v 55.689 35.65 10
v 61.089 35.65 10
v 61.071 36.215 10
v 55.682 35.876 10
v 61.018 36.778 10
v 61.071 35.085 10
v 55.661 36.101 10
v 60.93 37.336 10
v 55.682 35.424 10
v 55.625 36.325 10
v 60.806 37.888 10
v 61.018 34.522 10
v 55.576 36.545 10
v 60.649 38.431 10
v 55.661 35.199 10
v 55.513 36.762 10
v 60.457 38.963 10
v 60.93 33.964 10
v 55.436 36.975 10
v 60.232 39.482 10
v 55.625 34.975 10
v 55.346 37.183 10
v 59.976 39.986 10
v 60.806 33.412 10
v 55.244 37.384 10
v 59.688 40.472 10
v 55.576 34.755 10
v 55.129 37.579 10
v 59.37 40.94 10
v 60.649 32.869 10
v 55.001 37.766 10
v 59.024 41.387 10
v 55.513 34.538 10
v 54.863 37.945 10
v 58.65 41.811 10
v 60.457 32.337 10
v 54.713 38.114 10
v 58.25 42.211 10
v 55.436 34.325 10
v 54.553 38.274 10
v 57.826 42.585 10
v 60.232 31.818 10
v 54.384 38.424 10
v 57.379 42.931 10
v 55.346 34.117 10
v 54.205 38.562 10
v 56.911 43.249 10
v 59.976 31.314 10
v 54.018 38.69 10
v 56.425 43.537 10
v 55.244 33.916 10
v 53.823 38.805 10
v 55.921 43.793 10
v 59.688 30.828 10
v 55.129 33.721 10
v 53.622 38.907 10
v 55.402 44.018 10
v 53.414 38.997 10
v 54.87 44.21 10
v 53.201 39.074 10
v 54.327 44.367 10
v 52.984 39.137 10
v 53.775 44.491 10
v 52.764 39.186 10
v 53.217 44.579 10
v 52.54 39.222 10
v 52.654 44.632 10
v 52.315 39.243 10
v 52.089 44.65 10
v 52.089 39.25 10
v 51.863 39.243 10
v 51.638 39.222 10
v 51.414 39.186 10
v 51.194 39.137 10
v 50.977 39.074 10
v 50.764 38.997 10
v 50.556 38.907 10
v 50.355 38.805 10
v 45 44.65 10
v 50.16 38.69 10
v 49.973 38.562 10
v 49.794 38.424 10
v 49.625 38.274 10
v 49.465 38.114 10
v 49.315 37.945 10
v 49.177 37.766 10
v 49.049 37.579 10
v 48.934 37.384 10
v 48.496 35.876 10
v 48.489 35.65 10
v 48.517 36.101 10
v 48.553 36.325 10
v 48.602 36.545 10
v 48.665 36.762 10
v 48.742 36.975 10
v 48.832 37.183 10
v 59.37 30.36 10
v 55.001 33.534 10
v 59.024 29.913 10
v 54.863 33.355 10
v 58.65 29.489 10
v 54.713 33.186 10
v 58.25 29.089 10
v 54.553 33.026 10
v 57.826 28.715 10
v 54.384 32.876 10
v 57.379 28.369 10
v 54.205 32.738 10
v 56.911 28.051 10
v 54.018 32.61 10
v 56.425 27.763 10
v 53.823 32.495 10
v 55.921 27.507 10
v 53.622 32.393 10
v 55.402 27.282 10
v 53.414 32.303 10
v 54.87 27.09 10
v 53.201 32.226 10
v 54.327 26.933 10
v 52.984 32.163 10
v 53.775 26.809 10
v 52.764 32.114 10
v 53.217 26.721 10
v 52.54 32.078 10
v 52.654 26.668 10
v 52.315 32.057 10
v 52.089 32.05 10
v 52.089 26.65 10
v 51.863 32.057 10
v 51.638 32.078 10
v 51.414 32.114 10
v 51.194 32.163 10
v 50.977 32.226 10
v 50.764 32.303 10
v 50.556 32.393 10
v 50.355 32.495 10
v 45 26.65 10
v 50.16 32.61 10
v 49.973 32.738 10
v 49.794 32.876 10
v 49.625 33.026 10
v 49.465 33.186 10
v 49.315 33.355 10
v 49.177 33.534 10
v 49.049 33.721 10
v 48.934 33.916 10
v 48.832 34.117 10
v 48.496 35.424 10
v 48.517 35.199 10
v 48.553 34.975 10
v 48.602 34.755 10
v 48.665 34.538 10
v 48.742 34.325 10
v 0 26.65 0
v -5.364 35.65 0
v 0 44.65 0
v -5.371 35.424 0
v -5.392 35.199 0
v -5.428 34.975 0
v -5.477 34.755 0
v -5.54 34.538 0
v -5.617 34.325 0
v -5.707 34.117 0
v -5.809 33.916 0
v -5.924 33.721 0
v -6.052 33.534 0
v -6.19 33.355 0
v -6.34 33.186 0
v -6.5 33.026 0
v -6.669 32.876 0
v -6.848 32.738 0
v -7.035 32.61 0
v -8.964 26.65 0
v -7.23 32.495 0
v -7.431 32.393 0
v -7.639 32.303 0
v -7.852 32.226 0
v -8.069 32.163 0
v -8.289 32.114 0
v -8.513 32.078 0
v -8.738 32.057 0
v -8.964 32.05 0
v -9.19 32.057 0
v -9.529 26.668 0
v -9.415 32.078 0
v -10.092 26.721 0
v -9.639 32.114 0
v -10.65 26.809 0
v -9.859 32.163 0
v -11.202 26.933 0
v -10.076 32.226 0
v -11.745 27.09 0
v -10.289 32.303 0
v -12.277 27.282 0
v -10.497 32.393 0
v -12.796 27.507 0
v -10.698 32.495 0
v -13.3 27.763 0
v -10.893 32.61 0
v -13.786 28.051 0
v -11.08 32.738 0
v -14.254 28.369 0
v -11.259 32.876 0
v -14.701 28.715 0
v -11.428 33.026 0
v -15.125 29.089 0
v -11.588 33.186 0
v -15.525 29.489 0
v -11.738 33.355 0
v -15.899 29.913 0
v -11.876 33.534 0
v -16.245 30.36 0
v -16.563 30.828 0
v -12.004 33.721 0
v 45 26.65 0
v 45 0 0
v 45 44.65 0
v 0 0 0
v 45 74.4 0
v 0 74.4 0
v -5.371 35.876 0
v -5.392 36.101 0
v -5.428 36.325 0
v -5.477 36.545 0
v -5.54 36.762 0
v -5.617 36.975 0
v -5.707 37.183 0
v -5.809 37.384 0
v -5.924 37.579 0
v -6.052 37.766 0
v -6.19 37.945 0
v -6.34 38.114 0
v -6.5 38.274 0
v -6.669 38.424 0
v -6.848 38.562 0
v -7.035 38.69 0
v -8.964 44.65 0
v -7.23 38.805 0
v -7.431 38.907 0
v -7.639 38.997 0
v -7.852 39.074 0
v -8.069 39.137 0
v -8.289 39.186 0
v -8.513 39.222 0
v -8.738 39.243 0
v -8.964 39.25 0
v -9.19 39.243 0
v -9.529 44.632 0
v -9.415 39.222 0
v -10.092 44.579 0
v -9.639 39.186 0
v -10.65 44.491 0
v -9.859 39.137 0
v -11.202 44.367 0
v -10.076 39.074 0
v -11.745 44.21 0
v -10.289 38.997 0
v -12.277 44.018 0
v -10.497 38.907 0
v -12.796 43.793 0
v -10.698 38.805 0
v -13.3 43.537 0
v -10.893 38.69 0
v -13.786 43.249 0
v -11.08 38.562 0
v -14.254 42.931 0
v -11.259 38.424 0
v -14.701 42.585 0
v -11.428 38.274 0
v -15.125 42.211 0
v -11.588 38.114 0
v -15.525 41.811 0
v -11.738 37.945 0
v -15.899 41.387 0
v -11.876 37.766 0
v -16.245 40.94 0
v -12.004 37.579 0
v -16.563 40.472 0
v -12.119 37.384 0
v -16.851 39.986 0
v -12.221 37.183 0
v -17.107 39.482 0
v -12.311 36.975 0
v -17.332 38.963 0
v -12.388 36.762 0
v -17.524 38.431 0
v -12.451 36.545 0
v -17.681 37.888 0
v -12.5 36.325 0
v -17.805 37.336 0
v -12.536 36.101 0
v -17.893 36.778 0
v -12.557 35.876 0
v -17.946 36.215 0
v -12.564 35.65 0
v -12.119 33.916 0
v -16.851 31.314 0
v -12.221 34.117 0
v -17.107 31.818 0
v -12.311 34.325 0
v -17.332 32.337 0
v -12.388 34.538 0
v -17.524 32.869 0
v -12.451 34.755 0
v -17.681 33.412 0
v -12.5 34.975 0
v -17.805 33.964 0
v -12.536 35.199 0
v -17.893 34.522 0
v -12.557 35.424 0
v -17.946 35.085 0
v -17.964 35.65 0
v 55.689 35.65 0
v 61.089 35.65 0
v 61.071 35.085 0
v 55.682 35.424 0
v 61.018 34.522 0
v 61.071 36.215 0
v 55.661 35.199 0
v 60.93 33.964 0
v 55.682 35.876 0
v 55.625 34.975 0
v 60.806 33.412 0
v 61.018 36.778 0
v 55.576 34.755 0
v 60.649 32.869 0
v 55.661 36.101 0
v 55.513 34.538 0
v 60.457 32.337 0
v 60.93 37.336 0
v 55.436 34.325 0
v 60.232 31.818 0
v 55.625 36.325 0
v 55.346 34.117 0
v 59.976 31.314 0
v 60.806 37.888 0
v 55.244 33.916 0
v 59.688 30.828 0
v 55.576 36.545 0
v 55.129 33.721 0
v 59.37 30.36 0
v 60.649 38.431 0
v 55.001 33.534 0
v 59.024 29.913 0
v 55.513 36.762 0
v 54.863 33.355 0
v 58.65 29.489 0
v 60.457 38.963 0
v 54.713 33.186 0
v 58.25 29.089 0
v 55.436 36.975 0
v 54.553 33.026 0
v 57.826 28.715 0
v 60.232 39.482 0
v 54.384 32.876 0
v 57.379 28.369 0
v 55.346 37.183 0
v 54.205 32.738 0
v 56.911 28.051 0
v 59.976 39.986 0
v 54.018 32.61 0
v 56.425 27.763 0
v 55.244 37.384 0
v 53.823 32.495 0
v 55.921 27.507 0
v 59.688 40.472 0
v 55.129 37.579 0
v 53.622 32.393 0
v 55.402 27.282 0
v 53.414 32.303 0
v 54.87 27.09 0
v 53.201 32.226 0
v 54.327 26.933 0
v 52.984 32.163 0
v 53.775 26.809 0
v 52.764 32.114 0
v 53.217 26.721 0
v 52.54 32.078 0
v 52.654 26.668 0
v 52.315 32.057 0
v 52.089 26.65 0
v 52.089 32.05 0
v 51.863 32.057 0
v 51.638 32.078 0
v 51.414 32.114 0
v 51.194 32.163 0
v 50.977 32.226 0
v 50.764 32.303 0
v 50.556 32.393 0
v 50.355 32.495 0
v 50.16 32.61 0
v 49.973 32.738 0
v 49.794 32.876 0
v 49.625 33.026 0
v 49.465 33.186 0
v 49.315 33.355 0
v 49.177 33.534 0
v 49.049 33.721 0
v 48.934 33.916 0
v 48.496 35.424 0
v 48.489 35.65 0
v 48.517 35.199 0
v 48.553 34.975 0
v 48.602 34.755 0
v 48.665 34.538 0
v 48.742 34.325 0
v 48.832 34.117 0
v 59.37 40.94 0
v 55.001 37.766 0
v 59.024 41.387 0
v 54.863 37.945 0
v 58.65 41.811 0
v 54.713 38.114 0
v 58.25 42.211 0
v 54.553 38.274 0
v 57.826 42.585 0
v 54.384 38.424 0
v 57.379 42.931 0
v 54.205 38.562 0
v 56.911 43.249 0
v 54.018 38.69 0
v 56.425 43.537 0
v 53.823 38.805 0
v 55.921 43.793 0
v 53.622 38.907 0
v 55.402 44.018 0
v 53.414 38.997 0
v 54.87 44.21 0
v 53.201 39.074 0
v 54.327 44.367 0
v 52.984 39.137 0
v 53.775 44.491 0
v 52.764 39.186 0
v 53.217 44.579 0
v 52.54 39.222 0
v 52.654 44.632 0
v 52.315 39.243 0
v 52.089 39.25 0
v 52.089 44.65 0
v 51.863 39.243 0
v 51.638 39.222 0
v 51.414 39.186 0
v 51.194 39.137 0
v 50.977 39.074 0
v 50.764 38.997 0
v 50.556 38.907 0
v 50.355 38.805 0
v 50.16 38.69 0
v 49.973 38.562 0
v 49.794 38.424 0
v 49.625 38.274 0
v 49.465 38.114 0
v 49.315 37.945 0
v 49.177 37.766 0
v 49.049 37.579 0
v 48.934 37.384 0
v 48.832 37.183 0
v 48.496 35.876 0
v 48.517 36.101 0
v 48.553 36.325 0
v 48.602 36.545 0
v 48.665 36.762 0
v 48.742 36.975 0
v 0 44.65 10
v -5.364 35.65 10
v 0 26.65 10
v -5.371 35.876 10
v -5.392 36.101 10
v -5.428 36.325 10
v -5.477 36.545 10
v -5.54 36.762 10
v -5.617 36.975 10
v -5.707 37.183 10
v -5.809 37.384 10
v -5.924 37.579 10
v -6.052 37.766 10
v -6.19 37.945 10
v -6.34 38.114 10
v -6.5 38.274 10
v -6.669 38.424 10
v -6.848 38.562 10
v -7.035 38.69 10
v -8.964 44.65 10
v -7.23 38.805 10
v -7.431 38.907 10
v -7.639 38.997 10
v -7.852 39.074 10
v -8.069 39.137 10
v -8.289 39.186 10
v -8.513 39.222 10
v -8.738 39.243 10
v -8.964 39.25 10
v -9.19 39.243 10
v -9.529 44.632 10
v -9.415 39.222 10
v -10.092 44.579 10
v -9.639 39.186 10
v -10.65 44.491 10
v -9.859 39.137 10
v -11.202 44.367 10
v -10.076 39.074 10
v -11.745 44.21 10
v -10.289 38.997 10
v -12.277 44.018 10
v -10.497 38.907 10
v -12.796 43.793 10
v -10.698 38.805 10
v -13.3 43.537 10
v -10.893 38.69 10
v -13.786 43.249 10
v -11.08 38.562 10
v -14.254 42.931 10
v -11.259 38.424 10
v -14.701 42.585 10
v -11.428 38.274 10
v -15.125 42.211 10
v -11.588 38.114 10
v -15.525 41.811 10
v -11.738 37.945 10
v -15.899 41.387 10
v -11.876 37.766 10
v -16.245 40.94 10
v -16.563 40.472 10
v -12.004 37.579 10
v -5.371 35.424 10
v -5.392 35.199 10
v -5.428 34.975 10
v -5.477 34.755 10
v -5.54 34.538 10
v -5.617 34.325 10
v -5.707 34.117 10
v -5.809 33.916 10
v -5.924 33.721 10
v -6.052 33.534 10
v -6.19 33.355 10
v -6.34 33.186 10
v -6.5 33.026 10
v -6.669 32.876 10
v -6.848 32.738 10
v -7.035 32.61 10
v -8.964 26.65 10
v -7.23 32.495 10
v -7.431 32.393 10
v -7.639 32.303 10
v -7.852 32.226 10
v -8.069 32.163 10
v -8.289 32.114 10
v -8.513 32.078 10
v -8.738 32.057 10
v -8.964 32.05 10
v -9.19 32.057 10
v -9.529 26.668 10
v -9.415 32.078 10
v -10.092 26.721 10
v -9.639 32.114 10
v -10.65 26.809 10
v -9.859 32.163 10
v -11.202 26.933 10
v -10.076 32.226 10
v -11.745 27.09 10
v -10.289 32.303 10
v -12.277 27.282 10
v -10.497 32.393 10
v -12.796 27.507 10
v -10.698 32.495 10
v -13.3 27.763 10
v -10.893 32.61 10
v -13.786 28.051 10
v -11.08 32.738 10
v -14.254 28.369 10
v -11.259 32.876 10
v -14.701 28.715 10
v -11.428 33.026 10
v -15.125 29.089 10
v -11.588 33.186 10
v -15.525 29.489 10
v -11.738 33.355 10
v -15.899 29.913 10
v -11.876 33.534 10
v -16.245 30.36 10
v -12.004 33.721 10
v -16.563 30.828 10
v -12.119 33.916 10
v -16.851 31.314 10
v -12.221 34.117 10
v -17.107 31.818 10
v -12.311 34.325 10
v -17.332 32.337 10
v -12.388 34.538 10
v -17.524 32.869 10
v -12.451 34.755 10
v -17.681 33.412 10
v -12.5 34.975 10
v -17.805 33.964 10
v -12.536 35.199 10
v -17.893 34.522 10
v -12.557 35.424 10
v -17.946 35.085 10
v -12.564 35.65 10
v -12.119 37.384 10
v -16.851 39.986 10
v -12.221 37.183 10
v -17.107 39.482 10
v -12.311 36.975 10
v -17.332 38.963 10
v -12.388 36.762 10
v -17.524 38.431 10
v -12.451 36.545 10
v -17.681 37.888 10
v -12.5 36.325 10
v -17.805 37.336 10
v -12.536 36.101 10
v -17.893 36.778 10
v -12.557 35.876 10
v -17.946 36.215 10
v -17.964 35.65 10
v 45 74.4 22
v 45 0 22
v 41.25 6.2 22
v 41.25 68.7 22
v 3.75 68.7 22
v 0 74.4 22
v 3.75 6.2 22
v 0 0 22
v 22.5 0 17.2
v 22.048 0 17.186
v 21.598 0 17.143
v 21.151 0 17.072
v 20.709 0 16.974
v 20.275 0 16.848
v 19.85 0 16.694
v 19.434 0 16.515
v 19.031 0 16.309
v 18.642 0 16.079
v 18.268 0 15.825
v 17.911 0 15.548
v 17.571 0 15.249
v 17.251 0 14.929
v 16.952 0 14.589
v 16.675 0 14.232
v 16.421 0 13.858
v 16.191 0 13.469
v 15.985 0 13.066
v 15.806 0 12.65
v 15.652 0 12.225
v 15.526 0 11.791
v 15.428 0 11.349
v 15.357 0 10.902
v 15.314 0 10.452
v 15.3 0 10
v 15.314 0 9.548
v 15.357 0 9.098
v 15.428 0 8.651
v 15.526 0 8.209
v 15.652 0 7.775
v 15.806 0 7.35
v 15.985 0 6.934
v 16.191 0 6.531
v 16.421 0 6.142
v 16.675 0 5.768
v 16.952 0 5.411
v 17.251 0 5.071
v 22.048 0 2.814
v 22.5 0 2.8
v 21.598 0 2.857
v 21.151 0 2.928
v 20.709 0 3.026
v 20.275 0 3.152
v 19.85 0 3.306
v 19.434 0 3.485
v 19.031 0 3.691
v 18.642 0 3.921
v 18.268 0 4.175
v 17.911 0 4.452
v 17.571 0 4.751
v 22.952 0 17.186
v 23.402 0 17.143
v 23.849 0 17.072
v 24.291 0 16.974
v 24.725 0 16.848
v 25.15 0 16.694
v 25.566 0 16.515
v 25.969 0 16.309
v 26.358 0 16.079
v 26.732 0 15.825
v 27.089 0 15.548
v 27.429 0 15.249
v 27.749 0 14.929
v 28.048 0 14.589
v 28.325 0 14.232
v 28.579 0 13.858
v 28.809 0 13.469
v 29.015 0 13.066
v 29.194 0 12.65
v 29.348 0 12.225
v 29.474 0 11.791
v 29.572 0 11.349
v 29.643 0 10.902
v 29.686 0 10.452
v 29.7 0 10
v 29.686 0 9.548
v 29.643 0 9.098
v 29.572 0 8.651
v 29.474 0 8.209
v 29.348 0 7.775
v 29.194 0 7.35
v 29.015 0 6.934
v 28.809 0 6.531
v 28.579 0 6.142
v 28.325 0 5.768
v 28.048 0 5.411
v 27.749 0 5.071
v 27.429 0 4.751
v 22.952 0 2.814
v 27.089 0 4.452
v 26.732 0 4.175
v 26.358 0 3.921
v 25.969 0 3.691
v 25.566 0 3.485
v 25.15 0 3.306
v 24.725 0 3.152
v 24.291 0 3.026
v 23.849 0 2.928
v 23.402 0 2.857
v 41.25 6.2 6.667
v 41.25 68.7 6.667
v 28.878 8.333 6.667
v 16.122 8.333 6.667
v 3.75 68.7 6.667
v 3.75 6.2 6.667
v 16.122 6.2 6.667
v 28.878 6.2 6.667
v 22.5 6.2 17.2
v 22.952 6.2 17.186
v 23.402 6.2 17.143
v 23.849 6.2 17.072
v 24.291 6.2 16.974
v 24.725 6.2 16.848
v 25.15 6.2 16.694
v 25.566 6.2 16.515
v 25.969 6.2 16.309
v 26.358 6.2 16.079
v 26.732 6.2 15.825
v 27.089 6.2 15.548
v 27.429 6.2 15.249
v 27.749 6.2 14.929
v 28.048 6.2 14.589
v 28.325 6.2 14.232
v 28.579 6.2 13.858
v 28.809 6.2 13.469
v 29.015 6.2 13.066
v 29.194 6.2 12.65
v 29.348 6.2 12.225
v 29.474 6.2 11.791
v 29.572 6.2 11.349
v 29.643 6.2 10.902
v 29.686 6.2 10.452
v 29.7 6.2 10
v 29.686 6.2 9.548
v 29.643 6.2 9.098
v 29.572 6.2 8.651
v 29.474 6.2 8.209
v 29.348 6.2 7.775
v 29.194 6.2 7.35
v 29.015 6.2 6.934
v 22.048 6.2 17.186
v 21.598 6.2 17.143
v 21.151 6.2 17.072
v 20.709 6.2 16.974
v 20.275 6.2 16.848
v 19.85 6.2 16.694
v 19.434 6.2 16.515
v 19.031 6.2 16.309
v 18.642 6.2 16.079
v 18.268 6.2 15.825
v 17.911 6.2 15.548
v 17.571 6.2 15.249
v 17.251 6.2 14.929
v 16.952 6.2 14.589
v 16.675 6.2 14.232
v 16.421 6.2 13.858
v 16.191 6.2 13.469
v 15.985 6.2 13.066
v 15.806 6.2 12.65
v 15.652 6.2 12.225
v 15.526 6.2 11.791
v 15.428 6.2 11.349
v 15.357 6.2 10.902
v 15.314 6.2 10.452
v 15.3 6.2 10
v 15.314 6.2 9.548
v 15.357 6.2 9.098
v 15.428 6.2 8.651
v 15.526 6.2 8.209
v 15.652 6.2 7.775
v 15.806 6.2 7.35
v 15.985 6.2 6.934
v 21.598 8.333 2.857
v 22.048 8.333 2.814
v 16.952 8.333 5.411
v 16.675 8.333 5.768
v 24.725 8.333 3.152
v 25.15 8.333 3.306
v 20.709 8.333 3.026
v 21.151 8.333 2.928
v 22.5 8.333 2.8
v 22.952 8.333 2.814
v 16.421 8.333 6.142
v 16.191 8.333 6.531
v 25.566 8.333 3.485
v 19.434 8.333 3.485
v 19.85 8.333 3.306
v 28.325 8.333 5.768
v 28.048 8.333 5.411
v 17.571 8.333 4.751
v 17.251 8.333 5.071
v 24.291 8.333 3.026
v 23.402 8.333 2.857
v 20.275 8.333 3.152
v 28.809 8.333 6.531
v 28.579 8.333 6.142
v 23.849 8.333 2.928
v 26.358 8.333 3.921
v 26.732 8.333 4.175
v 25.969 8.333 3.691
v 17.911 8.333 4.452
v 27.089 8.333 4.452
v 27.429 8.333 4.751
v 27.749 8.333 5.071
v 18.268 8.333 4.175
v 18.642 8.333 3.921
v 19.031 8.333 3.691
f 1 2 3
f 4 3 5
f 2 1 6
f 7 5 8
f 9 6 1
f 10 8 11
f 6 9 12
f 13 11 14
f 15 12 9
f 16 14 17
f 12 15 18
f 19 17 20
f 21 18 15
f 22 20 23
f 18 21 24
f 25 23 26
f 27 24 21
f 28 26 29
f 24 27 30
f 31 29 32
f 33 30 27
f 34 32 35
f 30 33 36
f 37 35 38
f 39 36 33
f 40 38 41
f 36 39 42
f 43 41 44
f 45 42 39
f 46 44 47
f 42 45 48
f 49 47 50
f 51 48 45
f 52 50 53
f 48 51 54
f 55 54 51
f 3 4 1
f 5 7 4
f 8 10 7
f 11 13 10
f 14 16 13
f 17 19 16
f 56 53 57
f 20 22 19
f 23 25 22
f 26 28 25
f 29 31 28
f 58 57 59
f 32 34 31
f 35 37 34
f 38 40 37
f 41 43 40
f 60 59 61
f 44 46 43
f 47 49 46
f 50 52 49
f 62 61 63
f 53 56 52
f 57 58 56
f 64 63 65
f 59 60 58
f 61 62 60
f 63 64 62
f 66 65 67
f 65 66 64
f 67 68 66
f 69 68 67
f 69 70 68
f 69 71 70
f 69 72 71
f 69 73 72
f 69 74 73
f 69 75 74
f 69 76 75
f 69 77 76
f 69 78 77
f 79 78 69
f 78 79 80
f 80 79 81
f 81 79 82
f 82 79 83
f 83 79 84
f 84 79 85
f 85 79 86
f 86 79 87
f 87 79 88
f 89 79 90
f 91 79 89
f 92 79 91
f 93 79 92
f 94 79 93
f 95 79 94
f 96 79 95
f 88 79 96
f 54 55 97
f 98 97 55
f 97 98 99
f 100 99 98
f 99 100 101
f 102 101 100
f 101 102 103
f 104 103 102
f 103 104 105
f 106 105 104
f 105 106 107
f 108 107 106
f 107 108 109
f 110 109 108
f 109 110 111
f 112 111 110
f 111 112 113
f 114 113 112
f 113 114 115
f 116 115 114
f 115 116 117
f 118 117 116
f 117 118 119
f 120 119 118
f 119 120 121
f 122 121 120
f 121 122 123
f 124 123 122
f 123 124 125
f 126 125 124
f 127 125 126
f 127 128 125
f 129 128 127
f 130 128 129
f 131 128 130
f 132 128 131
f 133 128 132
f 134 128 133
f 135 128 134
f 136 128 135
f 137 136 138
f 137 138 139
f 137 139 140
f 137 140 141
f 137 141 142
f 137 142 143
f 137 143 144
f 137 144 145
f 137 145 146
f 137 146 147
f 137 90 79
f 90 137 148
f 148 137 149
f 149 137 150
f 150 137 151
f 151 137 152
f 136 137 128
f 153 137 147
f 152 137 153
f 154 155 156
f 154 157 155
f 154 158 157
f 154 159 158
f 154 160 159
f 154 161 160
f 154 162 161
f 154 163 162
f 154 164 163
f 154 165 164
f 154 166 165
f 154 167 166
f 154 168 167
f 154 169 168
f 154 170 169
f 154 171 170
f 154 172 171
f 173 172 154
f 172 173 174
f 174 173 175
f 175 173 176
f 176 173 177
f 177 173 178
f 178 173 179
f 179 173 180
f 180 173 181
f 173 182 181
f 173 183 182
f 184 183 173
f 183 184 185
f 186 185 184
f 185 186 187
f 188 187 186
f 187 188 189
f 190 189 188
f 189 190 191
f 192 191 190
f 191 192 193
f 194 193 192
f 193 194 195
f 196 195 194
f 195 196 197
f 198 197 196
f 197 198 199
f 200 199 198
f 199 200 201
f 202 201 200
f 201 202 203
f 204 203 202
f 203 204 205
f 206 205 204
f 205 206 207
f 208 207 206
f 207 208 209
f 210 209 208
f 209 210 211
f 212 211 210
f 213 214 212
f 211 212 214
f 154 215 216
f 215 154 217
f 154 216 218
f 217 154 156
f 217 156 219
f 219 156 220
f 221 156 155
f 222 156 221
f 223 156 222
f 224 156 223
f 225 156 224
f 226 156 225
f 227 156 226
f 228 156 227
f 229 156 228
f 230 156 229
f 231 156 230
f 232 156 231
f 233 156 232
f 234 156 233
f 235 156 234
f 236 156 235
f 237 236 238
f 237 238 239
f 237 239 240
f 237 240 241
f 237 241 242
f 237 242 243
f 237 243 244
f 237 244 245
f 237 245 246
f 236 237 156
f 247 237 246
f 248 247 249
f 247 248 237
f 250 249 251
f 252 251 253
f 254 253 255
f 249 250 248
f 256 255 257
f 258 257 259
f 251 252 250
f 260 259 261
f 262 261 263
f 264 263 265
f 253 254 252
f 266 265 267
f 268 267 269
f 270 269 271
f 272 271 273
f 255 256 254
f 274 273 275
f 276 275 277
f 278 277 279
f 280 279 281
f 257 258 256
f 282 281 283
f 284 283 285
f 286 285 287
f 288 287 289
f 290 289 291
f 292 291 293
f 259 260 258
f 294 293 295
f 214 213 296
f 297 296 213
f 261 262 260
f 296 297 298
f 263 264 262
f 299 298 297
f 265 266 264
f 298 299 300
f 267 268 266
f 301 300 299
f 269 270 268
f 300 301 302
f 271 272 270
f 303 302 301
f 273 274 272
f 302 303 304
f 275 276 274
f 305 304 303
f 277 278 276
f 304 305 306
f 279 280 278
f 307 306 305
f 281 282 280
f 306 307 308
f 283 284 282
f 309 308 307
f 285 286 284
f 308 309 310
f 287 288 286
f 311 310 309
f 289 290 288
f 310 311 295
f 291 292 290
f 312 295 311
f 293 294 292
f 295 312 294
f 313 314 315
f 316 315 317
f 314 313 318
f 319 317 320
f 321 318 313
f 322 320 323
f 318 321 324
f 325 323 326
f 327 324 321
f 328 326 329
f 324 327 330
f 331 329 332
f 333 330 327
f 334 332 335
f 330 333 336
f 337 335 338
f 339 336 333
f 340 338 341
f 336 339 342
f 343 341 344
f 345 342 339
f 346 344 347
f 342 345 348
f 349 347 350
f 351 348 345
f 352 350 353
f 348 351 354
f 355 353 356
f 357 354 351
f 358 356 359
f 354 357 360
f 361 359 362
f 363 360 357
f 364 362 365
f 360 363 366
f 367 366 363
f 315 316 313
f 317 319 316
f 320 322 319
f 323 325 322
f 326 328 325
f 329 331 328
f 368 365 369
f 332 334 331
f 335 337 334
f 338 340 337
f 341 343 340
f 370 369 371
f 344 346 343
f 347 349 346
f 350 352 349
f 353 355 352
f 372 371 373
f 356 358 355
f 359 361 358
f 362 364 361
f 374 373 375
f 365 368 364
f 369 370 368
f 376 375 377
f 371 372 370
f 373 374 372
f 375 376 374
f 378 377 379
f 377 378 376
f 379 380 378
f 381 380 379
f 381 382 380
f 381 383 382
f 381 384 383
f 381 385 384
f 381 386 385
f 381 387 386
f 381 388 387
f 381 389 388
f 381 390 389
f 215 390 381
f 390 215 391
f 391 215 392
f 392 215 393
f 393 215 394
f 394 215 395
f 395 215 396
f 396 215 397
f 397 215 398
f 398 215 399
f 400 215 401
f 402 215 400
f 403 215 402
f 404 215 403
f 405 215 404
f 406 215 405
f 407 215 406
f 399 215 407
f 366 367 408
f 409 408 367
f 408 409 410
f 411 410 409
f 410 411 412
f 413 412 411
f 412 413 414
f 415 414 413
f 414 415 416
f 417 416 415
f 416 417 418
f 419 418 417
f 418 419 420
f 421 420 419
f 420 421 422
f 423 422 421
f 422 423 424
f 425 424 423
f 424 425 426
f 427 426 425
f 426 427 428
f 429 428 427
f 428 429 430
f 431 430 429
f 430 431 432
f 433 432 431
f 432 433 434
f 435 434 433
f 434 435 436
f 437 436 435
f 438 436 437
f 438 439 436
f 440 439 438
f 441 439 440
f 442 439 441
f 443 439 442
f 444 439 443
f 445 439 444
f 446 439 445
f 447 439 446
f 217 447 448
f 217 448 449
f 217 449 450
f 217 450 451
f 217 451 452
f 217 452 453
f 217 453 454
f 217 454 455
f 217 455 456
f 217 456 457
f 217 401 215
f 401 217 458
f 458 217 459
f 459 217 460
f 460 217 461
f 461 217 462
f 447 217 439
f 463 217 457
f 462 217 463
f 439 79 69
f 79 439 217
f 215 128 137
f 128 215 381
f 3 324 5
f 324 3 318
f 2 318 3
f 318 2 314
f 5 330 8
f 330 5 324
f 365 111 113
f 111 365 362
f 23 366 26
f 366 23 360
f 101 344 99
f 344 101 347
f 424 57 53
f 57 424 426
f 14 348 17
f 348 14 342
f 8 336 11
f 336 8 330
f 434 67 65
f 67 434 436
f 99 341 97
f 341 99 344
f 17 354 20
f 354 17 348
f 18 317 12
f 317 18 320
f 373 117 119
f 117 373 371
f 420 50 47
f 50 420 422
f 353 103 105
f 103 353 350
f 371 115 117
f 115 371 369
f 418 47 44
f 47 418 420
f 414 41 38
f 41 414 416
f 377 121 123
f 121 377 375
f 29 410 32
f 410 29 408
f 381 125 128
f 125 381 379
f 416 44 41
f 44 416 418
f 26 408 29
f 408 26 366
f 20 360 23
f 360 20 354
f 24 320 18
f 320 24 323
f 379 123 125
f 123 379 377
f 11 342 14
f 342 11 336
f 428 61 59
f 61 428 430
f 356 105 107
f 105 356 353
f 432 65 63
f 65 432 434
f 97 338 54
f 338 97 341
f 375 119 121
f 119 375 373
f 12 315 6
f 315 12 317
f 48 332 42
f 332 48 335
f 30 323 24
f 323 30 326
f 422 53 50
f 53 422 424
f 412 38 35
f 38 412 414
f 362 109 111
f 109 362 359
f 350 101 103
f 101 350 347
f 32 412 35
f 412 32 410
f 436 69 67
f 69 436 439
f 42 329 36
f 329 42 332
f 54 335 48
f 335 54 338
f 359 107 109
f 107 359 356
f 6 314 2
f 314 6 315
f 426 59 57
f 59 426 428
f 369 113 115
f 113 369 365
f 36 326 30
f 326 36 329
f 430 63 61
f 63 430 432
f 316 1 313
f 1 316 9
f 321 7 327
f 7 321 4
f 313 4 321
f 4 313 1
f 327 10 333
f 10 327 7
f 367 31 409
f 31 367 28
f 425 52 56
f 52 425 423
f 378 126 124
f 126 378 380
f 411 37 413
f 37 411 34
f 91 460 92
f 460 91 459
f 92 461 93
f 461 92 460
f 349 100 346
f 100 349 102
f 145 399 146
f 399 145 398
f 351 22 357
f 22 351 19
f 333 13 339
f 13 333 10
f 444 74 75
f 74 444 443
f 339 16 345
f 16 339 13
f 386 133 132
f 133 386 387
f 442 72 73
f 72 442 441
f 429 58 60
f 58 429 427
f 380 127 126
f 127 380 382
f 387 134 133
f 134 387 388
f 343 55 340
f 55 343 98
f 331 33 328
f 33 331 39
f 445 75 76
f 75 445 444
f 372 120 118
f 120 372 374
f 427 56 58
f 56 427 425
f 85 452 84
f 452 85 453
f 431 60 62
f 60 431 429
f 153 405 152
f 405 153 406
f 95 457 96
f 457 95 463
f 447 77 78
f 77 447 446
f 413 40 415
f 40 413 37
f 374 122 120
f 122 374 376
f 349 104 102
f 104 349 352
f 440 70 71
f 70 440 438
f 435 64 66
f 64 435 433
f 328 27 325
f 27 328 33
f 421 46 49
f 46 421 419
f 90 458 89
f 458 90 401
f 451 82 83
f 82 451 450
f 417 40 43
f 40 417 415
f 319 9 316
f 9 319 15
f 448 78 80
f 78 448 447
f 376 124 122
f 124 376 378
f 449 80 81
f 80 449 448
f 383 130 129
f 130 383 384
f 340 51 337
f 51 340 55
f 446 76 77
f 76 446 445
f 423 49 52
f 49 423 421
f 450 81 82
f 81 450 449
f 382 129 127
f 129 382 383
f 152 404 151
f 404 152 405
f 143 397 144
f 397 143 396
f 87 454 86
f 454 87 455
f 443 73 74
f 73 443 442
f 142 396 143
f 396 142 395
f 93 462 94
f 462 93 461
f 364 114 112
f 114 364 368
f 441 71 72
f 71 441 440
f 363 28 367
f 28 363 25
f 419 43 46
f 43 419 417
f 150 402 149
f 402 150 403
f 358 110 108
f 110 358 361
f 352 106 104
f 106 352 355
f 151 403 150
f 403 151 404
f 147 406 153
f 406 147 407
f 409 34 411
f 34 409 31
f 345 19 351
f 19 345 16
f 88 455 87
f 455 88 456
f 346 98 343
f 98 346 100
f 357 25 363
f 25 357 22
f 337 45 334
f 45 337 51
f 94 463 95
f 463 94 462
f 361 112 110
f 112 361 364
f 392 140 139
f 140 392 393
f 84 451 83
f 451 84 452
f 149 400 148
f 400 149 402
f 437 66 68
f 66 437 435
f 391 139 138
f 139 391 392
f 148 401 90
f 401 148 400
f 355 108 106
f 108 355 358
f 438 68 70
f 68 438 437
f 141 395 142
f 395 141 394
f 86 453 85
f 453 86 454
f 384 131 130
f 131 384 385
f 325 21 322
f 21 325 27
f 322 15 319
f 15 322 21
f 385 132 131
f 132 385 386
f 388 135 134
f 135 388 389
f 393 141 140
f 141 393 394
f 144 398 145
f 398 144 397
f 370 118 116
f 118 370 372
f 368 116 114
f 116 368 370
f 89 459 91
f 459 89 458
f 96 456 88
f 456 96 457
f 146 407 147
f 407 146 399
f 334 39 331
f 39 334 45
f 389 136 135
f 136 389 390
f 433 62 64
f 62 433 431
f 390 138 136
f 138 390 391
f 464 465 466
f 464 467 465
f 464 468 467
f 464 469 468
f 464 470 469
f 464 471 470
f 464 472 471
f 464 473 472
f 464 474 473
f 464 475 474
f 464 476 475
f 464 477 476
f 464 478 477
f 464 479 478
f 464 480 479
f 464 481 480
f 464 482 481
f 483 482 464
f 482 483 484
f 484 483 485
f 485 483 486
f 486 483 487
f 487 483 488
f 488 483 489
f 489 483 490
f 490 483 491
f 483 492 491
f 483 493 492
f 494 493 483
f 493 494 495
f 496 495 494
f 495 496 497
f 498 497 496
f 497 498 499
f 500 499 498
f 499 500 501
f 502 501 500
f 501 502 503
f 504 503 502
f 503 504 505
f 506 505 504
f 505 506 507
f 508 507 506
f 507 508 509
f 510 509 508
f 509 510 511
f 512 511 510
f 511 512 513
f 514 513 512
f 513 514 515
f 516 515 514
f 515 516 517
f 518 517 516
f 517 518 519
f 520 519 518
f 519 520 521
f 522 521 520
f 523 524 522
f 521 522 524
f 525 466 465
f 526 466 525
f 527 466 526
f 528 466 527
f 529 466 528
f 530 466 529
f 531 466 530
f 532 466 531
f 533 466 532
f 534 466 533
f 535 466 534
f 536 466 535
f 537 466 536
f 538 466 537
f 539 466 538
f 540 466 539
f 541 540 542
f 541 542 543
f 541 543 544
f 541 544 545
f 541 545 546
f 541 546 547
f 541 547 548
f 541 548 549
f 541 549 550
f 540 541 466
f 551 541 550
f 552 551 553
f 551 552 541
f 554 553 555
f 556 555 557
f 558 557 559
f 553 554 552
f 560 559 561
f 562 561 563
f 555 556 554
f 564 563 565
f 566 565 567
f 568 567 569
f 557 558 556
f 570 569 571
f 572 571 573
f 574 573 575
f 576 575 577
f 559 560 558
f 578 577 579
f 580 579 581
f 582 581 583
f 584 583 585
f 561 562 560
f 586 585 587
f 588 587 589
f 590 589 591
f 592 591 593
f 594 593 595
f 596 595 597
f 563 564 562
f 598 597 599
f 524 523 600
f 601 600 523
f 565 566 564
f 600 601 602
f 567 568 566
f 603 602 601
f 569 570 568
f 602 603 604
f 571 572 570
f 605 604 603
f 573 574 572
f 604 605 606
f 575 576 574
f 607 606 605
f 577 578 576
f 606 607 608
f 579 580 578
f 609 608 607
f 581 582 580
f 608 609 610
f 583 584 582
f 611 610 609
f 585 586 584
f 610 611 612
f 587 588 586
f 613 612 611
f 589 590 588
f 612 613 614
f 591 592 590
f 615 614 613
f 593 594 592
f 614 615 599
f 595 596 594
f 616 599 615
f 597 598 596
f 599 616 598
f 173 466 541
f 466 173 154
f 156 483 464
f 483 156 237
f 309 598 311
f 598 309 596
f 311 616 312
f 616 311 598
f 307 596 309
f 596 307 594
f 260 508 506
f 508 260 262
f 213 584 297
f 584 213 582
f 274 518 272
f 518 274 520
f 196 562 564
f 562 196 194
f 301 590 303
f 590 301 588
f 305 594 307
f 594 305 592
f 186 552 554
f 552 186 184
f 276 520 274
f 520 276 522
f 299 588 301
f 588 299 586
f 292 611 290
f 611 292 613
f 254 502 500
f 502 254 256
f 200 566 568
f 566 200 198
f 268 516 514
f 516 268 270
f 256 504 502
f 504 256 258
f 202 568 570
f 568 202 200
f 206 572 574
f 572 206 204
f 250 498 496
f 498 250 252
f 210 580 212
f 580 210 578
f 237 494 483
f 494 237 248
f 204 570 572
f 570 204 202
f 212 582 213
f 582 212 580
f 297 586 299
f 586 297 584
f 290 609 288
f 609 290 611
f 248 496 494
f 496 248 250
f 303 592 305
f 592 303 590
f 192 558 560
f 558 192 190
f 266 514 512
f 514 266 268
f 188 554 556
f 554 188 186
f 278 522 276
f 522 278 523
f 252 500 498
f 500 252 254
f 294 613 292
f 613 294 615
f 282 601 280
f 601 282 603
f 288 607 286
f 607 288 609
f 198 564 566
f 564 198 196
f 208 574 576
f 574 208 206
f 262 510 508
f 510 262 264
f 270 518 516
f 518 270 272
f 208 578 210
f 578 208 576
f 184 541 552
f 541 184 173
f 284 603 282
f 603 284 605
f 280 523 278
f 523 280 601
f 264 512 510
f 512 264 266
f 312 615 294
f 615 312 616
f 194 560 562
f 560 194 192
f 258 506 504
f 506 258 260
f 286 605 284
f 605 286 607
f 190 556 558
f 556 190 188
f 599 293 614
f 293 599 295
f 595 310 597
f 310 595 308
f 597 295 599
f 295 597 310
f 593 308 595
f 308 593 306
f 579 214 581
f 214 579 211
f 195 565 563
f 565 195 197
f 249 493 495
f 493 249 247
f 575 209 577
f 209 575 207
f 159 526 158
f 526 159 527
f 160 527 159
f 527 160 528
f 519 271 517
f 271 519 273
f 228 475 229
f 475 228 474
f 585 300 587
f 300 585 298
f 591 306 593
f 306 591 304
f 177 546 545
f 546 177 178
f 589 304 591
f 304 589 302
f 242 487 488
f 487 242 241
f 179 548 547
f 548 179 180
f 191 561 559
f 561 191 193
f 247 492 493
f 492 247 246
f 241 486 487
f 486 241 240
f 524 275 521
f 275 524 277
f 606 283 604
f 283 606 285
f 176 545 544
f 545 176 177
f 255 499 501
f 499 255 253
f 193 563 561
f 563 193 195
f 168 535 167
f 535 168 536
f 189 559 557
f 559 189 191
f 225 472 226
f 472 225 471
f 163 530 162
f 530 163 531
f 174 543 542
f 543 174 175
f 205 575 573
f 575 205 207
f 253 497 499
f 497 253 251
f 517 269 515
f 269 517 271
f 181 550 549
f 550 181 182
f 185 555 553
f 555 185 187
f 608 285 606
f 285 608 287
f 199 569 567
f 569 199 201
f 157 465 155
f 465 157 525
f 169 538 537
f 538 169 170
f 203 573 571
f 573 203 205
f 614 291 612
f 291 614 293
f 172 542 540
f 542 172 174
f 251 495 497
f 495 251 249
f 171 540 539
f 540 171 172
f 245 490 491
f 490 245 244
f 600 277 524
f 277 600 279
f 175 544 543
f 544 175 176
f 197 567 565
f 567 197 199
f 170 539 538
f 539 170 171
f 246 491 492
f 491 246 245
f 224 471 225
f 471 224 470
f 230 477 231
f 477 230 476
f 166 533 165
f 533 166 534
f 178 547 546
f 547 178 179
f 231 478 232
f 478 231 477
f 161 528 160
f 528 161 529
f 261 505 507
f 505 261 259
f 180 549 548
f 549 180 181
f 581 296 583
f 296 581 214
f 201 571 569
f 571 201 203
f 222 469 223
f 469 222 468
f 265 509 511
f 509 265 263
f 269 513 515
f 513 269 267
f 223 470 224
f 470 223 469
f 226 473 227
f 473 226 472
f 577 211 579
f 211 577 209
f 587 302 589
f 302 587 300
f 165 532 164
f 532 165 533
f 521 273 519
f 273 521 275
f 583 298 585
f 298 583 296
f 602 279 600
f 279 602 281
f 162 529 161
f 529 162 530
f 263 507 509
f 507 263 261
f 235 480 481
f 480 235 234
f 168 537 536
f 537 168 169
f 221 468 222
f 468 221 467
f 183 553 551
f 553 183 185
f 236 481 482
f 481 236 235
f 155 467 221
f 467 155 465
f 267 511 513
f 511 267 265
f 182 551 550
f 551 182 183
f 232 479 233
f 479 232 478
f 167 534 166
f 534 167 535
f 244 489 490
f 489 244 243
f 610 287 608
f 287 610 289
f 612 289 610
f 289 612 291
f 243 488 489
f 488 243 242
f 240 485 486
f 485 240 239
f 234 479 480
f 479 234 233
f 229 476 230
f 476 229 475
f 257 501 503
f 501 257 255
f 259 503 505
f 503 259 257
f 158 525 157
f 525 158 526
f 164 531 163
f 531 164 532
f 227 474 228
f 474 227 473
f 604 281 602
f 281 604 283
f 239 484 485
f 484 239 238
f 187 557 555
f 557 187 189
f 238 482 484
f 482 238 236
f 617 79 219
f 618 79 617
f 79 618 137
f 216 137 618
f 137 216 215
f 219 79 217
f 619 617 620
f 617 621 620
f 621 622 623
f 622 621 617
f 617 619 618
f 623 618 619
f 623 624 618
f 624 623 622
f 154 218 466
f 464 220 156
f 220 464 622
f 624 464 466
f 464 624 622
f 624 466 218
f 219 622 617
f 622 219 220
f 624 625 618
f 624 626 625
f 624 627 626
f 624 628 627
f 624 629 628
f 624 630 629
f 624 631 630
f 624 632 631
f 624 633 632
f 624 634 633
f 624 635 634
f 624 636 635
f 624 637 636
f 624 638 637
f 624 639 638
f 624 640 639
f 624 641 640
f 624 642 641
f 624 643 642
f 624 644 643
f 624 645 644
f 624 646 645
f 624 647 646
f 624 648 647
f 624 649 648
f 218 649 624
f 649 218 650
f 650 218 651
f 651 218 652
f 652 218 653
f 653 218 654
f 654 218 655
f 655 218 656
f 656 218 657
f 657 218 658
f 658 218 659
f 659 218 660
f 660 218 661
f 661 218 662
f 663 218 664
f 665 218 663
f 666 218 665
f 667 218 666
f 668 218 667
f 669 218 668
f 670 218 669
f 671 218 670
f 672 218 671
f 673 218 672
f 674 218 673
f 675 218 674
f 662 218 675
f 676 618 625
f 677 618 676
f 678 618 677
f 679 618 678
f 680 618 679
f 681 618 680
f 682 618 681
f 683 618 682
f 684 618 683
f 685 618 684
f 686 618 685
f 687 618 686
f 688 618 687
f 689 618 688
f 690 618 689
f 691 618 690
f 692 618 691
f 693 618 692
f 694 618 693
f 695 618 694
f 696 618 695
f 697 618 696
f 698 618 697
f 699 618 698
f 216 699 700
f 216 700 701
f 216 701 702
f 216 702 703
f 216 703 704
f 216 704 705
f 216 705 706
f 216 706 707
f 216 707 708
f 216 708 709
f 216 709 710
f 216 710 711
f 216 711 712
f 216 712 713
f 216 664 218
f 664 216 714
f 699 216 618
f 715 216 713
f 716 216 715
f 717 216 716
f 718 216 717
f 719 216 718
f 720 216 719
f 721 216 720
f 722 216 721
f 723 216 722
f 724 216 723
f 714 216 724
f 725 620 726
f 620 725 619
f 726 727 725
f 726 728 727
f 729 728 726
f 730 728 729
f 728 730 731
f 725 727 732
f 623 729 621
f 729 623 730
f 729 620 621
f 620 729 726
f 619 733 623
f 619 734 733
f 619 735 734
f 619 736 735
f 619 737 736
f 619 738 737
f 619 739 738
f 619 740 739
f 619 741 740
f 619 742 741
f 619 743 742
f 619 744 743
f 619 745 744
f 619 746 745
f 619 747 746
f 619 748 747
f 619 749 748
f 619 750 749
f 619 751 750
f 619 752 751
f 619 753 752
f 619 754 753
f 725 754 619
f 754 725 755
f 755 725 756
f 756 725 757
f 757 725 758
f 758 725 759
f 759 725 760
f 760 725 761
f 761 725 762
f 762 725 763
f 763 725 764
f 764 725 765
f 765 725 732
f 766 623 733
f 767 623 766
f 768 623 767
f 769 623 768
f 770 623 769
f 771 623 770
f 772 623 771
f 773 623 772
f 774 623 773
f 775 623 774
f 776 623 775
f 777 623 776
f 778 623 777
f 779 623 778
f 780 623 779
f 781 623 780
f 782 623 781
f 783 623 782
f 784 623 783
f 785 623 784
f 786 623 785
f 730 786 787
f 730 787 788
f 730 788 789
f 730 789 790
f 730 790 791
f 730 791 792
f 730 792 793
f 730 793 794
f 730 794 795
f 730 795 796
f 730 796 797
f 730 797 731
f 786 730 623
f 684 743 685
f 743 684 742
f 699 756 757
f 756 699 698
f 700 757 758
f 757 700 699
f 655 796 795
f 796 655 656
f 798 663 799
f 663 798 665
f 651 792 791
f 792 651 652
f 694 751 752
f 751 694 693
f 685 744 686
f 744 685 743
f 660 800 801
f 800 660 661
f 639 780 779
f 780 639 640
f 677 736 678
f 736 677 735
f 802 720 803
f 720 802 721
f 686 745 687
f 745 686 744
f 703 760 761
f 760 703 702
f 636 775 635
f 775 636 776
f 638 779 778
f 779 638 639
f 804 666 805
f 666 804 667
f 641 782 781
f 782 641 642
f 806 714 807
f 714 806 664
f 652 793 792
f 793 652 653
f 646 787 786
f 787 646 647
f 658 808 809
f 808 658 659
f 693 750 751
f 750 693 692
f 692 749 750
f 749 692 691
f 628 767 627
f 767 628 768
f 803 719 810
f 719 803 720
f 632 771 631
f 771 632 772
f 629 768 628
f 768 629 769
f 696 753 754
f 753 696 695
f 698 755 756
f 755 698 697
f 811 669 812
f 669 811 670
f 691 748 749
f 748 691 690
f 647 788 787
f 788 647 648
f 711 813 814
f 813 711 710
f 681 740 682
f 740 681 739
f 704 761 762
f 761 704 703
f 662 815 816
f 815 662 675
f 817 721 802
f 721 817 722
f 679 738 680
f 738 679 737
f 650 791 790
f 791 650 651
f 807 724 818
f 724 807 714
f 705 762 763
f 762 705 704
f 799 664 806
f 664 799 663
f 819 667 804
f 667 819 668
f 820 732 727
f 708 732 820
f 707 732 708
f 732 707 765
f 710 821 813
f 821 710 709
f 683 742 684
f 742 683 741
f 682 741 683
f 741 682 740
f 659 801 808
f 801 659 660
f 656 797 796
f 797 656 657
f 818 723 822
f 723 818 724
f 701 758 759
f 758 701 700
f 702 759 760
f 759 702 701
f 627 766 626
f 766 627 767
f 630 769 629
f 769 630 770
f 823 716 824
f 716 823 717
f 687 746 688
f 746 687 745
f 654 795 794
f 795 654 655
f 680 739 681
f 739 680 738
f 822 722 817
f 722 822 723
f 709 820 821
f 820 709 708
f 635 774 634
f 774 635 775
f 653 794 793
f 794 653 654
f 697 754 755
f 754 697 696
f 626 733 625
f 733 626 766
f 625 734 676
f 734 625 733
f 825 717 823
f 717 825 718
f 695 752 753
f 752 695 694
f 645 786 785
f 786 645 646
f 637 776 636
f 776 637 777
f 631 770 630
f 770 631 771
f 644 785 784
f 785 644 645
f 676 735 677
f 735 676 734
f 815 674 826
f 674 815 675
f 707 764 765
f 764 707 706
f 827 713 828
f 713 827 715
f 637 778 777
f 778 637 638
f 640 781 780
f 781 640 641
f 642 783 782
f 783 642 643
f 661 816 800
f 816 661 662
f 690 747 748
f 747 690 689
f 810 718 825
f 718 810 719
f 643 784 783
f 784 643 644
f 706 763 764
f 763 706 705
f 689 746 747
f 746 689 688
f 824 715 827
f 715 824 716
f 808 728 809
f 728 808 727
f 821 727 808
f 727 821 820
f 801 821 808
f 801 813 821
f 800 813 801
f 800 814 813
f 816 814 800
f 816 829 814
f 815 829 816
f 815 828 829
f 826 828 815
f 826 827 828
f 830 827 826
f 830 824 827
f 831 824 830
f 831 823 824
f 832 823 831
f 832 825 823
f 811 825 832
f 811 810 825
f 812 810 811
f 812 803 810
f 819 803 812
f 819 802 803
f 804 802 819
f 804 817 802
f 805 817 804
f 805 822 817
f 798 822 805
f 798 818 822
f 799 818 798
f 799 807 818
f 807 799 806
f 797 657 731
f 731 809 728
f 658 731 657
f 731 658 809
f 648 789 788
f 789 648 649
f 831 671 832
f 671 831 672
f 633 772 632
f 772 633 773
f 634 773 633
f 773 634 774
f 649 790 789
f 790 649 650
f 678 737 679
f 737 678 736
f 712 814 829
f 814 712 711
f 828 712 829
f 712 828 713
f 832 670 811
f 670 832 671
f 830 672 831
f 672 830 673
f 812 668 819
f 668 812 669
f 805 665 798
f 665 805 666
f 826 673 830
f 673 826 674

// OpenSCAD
l = 37.5;
w = 62;
h = 20;
$fn=100;
h1 = h/2;
//Screw radius
sc = 7.2/2; // 0.25"
//Antenna radius
ar = 7.2;


module box(){
	difference(){
		cube([1.2*l,1.2*w,1.1*h]);
		translate([0.1*l,0.1*w, h/3])cube([l,w+0.5, h+0.1]);
        translate([1.2*l/2,h1/1.2,h/2])rotate([90,0,0])cylinder(h=h1*2, r=ar);
        //translate([1.1*l/4,4.7*w/5,-0.1])cube([1.1*l/2,6,10]);
	}
    
    
}

module foot() {
    module f(){ //boxy inner edge
        translate([-sc*2.5,-sc*2.5,0])cube([sc*2.5,sc*5,h1]);
        cylinder(h = h1, r=sc*2.5);
    }
	difference(){ //actual hole
		f();
		translate([0,0,-0.1])cylinder(h = h1+1, r=sc);
	}

}


module DigiMount(){
	translate([1.15*l+sc*2.49,1.15*w/2,0])foot();
	translate([-sc*2.49,1.15*w/2,0])rotate([0,0,180])foot();
	box();
}

DigiMount();
